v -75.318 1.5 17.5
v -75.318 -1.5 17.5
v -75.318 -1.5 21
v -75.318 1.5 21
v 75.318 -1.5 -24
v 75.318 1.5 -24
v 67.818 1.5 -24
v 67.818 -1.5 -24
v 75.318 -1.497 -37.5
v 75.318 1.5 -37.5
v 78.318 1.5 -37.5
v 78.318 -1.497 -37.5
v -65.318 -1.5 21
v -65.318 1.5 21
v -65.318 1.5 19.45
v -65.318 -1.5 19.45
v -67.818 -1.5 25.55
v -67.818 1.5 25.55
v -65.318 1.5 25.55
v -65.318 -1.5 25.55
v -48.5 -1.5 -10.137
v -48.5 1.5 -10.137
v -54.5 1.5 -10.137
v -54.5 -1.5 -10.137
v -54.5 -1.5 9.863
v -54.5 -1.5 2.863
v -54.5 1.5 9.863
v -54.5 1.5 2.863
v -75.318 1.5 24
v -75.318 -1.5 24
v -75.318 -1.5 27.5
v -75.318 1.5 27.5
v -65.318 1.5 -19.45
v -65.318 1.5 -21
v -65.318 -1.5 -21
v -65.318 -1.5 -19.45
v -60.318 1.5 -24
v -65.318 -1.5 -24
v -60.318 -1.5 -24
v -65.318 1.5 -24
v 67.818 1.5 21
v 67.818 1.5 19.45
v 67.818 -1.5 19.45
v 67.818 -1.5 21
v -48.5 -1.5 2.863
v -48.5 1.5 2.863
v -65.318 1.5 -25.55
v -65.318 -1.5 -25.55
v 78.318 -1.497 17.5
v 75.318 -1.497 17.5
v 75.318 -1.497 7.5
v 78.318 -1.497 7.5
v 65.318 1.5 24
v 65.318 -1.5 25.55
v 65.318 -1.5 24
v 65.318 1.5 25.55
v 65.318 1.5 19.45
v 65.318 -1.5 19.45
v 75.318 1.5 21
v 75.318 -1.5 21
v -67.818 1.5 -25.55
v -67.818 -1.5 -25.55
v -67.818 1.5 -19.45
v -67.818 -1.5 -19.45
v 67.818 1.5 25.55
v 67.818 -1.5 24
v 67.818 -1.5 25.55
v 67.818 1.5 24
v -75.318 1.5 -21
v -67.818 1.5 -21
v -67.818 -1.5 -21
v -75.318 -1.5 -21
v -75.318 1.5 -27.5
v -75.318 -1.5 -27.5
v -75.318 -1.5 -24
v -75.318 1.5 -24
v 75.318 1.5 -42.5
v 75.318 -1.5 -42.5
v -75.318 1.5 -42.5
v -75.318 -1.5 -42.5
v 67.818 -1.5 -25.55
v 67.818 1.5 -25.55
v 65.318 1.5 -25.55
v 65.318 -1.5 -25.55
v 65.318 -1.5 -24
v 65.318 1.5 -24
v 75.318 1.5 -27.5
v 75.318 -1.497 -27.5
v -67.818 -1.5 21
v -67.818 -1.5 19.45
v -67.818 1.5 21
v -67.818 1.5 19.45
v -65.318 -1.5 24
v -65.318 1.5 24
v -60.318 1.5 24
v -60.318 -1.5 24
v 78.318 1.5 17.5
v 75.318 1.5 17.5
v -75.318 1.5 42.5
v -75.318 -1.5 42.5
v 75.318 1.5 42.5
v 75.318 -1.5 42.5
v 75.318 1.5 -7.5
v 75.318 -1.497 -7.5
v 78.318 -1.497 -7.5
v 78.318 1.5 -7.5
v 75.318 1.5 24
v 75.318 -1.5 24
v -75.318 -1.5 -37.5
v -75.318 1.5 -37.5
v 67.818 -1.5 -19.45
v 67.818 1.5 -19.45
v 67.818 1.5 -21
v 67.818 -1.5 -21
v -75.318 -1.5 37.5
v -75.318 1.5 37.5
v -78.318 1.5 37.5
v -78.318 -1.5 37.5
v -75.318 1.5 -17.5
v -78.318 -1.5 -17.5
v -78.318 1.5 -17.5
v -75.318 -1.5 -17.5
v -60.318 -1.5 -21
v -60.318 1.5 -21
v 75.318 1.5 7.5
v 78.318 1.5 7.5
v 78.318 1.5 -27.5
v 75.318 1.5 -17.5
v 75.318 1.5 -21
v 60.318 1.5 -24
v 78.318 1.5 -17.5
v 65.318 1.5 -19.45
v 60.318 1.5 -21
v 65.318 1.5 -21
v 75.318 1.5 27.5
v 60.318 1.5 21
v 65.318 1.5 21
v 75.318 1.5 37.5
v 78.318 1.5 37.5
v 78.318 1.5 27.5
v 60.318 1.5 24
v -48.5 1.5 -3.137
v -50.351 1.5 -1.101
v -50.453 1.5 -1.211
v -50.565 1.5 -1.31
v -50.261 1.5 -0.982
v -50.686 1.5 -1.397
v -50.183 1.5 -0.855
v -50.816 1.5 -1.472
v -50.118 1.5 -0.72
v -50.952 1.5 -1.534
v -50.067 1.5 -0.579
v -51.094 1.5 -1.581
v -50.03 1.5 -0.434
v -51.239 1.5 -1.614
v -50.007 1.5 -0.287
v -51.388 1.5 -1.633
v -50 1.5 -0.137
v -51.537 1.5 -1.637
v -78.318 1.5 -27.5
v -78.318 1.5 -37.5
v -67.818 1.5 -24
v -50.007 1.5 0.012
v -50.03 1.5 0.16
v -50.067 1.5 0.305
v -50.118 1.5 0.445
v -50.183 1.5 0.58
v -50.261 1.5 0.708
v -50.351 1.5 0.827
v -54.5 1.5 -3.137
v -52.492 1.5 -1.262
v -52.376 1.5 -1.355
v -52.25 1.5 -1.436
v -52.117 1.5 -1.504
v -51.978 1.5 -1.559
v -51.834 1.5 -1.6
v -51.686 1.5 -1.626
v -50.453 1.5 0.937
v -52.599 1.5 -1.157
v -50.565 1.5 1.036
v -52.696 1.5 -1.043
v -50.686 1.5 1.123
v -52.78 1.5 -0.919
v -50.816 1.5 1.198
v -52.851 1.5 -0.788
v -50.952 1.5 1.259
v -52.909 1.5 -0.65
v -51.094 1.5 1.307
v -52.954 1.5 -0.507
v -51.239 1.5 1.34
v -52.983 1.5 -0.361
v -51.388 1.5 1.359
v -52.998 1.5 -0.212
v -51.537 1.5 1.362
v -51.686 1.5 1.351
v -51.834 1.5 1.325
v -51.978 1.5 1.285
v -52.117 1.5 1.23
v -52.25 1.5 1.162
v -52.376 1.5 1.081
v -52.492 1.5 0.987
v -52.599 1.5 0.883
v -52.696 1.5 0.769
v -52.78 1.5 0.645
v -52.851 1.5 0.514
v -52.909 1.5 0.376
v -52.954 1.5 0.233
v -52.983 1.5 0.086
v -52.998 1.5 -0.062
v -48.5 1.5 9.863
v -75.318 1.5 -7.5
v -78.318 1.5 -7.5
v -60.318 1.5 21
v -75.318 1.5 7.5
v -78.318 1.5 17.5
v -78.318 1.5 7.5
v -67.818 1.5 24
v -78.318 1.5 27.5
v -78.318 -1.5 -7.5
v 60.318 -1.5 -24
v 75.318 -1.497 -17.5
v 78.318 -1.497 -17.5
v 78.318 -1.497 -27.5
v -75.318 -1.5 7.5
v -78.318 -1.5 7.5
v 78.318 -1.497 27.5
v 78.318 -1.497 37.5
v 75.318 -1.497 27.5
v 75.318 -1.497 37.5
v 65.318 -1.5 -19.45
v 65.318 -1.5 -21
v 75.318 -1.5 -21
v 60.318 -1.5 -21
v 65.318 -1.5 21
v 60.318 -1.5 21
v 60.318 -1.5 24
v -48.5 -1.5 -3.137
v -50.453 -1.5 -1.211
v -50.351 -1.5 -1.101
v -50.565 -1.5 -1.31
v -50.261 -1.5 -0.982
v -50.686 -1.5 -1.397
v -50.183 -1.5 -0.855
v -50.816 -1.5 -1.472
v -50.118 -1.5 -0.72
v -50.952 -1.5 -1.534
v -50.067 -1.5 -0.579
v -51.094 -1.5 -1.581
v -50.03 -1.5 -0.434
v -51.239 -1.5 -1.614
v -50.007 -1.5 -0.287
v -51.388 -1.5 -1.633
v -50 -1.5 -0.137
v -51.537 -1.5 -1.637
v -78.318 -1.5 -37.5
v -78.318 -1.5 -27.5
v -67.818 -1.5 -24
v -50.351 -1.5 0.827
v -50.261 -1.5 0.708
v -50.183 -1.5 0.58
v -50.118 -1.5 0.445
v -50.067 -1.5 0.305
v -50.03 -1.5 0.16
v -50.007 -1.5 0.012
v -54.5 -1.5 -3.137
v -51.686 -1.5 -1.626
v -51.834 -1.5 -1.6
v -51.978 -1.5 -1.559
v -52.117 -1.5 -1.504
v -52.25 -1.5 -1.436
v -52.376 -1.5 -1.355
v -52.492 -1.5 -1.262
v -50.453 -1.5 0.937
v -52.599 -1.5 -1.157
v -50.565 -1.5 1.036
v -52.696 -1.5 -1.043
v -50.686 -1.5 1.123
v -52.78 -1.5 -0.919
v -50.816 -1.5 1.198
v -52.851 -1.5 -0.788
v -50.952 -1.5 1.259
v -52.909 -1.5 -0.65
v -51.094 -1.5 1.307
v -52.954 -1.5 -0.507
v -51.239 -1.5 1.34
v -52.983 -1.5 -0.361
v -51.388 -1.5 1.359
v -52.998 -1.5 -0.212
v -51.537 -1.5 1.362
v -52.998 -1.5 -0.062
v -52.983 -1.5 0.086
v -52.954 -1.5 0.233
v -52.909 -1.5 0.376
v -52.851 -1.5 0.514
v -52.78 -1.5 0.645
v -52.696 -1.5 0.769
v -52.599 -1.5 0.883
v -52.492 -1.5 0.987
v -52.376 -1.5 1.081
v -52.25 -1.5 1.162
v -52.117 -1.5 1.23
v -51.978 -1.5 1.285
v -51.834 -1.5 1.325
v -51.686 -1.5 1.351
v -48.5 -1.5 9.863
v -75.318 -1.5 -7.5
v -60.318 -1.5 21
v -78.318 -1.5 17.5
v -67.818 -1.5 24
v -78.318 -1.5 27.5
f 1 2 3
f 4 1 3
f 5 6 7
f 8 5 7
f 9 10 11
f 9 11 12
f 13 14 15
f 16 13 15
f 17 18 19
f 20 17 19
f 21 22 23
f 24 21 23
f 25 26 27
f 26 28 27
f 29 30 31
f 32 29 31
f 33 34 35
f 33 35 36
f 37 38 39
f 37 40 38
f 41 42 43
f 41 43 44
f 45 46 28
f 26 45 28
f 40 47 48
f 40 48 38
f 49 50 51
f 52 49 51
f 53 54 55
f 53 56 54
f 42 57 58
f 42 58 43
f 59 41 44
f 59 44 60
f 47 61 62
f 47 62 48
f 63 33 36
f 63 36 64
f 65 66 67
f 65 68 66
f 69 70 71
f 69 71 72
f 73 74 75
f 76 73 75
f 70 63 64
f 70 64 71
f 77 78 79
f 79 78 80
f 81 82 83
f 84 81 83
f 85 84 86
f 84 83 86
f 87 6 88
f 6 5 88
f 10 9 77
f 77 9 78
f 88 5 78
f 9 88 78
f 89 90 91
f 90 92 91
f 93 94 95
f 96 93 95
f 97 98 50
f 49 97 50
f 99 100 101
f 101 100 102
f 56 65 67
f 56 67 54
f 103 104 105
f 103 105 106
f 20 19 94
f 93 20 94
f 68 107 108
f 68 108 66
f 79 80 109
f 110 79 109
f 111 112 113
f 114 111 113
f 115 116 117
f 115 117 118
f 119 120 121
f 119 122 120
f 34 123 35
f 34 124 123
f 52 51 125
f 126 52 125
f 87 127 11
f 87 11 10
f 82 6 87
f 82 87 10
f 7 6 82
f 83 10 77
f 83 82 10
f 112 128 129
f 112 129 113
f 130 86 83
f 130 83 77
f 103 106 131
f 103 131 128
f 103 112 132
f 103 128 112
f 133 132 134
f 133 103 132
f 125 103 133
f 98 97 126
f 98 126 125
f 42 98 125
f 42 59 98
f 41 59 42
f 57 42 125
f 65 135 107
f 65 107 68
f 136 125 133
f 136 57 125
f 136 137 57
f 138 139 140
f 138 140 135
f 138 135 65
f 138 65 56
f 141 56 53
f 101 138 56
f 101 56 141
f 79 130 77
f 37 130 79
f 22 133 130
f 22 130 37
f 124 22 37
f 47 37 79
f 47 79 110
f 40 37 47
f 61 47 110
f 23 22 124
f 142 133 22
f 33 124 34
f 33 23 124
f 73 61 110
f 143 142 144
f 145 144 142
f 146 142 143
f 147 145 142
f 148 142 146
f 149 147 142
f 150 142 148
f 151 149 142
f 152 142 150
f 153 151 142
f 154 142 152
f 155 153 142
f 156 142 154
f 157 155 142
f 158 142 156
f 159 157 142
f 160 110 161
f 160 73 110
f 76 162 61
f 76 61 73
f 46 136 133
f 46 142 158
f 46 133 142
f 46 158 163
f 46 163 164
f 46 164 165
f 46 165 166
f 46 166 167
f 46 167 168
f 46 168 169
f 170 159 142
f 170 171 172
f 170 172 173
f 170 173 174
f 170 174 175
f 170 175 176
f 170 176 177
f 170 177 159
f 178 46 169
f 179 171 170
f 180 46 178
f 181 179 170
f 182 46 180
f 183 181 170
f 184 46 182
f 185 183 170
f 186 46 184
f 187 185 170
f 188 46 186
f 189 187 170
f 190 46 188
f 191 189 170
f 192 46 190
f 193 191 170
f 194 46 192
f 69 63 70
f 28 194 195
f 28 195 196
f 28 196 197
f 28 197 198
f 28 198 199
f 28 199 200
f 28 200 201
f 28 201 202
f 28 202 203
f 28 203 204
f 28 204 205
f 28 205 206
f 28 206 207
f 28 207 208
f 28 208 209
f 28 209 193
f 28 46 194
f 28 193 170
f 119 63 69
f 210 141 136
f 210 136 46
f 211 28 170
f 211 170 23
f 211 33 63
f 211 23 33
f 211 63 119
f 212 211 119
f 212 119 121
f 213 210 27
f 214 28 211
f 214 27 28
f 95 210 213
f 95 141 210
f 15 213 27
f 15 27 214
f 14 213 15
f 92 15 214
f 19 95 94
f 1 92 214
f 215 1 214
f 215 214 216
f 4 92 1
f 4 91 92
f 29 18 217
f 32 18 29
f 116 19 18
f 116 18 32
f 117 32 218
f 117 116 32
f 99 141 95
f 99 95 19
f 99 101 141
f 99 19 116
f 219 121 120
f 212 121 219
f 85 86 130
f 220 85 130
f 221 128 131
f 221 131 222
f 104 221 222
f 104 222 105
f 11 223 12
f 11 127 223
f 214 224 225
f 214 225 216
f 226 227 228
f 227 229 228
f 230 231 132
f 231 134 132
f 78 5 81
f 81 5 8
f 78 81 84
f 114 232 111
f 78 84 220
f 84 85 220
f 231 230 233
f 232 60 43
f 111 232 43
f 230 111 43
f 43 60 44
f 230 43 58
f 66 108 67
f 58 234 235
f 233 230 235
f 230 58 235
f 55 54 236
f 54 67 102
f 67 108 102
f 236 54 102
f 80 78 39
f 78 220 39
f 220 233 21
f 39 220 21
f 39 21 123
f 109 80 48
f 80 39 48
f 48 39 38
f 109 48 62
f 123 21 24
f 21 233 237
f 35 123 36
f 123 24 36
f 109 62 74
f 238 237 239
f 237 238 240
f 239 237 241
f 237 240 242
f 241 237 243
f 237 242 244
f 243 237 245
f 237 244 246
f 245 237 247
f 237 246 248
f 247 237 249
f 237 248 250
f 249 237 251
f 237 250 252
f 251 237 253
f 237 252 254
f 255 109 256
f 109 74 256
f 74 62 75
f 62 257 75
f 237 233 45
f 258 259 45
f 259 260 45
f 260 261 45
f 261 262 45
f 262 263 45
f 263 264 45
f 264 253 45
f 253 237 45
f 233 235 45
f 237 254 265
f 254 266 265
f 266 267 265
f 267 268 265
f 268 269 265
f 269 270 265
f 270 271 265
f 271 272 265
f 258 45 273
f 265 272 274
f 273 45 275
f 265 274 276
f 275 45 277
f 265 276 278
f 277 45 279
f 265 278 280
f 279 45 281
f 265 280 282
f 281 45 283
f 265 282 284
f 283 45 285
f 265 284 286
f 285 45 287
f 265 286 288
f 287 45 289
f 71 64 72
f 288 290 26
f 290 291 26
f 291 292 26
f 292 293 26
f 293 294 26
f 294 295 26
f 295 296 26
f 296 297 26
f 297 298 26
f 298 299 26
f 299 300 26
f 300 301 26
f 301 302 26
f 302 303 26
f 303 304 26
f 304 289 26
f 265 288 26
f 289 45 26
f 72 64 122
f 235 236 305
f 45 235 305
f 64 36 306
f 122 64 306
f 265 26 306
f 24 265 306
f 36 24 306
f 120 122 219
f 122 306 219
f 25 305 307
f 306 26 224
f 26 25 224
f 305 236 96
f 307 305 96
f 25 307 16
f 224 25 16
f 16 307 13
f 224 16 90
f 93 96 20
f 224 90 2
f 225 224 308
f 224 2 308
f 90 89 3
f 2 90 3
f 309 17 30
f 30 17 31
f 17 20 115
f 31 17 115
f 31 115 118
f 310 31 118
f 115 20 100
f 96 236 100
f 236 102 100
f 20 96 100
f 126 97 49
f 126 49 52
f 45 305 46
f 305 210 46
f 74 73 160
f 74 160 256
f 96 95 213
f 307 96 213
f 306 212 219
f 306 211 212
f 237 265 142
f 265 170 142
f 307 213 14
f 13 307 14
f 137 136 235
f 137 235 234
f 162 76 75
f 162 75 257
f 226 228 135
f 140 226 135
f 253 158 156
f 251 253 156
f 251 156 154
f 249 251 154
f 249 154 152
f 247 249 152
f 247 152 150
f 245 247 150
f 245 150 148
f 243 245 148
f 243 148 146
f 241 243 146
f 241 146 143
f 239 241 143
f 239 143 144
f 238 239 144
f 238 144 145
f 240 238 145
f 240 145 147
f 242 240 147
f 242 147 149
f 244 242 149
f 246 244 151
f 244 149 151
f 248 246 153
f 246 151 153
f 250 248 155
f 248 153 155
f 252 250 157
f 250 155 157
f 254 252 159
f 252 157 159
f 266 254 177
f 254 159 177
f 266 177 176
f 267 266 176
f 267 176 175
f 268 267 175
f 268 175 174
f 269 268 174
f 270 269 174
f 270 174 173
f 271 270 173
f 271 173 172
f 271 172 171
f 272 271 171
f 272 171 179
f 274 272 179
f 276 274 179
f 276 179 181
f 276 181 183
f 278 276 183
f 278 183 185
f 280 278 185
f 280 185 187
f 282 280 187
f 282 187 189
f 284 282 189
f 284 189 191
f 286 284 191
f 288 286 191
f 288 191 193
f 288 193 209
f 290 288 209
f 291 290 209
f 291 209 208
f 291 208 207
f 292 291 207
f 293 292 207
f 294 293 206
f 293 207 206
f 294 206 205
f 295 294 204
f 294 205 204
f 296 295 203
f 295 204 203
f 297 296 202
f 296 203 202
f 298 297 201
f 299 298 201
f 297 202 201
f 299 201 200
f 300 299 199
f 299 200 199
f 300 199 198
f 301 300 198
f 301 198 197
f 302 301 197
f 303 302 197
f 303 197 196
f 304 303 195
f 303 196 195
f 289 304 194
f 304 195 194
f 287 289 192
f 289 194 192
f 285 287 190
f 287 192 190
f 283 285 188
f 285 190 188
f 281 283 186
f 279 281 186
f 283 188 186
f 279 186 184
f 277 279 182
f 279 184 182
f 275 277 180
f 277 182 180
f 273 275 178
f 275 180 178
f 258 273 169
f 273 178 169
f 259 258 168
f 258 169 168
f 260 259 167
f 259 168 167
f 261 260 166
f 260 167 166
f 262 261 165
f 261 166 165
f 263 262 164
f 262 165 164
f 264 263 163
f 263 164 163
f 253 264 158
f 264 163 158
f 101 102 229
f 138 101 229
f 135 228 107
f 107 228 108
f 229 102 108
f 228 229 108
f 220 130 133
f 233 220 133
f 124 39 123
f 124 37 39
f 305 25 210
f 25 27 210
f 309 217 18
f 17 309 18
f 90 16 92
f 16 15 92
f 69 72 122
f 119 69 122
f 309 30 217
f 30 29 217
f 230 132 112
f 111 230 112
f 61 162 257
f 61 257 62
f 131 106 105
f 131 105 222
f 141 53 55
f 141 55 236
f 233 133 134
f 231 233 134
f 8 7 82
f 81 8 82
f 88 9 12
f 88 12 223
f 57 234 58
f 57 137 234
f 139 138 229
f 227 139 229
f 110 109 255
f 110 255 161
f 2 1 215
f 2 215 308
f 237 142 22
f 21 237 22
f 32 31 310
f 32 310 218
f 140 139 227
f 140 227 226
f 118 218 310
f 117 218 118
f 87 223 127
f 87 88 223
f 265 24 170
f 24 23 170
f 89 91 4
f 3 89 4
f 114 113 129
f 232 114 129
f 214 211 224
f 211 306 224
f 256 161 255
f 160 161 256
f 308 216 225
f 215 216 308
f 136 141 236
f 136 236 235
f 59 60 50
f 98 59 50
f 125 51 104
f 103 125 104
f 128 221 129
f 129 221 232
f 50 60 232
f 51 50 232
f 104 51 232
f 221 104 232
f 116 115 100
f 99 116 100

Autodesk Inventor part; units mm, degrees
ref_plane "YZ Plane" through (0, 0, 0) normal (1, 0, 0) x (0, 1, 0)
ref_plane "XZ Plane" through (0, 0, 0) normal (0, 1, 0) x (-1, 0, 0)
ref_plane "XY Plane" through (0, 0, 0) normal (0, 0, 1) x (1, 0, 0)
sketch "Эскиз1" plane through (0, 0, 0) normal (0, 1, 0) x (-1, 0, 0)
  line L0 (75.318, 42.5) -> (-75.318, 42.5)
  line L1 (-75.318, 42.5) -> (-75.318, -42.5)
  line L2 (-75.318, -42.5) -> (75.318, -42.5)
  line L3 (75.318, -42.5) -> (75.318, 42.5)
  line L4 (75.318, 42.5) -> (-75.318, -42.5) construction
  line L5 (-75.318, 42.5) -> (75.318, -42.5) construction
  point P0 (0, 0)
  dimension "d0" = 150.636
  dimension "d1" = 85
extrude "Выдавливание1" add sketch "Эскиз1" along normal mid plane 3
sketch "Эскиз3" plane through (-75.318, -1.5, 42.5) normal (-1, 0, 0) x (0, 0, 1)
  line L0 (-85, 0) -> (0, 0) projected
  line L1 (-80, 3) -> (-70, 3)
  line L2 (-70, 3) -> (-70, 0)
  line L3 (-70, 0) -> (-80, 0)
  line L4 (-80, 0) -> (-80, 3)
  line L5 (-80, 3) -> (-70, 0) construction
  line L6 (-70, 3) -> (-80, 0) construction
  line L7 (-60, 3) -> (-50, 3)
  line L8 (-50, 3) -> (-50, 0)
  line L9 (-50, 0) -> (-60, 0)
  line L10 (-60, 0) -> (-60, 3)
  line L11 (-60, 3) -> (-50, 0) construction
  line L12 (-50, 3) -> (-60, 0) construction
  line L13 (-35, 3) -> (-25, 3)
  line L14 (-25, 3) -> (-25, 0)
  line L15 (-25, 0) -> (-35, 0)
  line L16 (-35, 0) -> (-35, 3)
  line L17 (-35, 3) -> (-25, 0) construction
  line L18 (-25, 3) -> (-35, 0) construction
  line L19 (-15, 3) -> (-5, 3)
  line L20 (-5, 3) -> (-5, 0)
  line L21 (-5, 0) -> (-15, 0)
  line L22 (-15, 0) -> (-15, 3)
  line L23 (-15, 3) -> (-5, 0) construction
  line L24 (-5, 3) -> (-15, 0) construction
  line L25 (0, 0) -> (0, 3) projected
  line L26 (-85, 0) -> (-85, 3) projected
  point P0 (-42.5, 1.5)
  point P1 (-75, 1.5)
  point P2 (-55, 1.5)
  point P3 (-30, 1.5)
  point P4 (-10, 1.5)
  point P5 (-15, 1.5)
  point P6 (-25, 1.5)
  point P7 (-60, 1.5)
  point P8 (-35, 0)
  point P9 (-15, 0)
  dimension "d8" = 10
  dimension "d9" = 10
  dimension "d10" = 10
  dimension "d11" = 10
  dimension "d12" = 3
  dimension "d13" = 10
  dimension "d14" = 10
  dimension "d15" = 5
  dimension "d16" = 5
extrude "Выдавливание3" add sketch "Эскиз3" along normal blind 3
sketch "Эскиз4" plane through (75.318, -1.5, -42.5) normal (1, 0, 0) x (0, 0, -1)
  line L0 (-85, 3) -> (0, 3) projected
  line L1 (-80, 0.0026) -> (-70, 0.0026)
  line L2 (-70, 0.0026) -> (-70, 3)
  line L3 (-70, 3) -> (-80, 3)
  line L4 (-80, 3) -> (-80, 0.0026)
  line L5 (-80, 0.0026) -> (-70, 3) construction
  line L6 (-70, 0.0026) -> (-80, 3) construction
  line L7 (-60, 0.0026) -> (-50, 0.0026)
  line L8 (-50, 0.0026) -> (-50, 3)
  line L9 (-50, 3) -> (-60, 3)
  line L10 (-60, 3) -> (-60, 0.0026)
  line L11 (-60, 0.0026) -> (-50, 3) construction
  line L12 (-50, 0.0026) -> (-60, 3) construction
  line L13 (-42.5, 3) -> (-42.5, 0) construction
  line L14 (0, 0) -> (-85, 0) projected
  line L15 (-5, 0.0026) -> (-15, 0.0026)
  line L16 (-15, 0.0026) -> (-15, 3)
  line L17 (-15, 3) -> (-5, 3)
  line L18 (-5, 3) -> (-5, 0.0026)
  line L19 (-5, 0.0026) -> (-15, 3) construction
  line L20 (-15, 0.0026) -> (-5, 3) construction
  line L21 (-25, 0.0026) -> (-35, 0.0026)
  line L22 (-35, 0.0026) -> (-35, 3)
  line L23 (-35, 3) -> (-25, 3)
  line L24 (-25, 3) -> (-25, 0.0026)
  line L25 (-25, 0.0026) -> (-35, 3) construction
  line L26 (-35, 0.0026) -> (-25, 3) construction
  line L27 (-85, 3) -> (-85, 0) projected
  point P0 (-42.5, 1.5)
  point P1 (-75, 1.5013)
  point P2 (-55, 1.5013)
  point P3 (-10, 1.5013)
  point P4 (-30, 1.5013)
  point P5 (-35, 3)
  point P6 (-5, 3)
  point P7 (-15, 3)
  dimension "d19" = 10
  dimension "d24" = 20
  dimension "d29" = 5
extrude "Выдавливание4" add sketch "Эскиз4" along normal blind 3
sketch "Эскиз5" plane through (0, 1.5, 0) normal (0, 1, 0) x (1, 0, 0)
  line L0 (-75.318, 7.5) -> (-75.318, -7.5) projected
  line L1 (-54.4999, -2.8628) -> (-54.4999, -9.8628)
  line L2 (-54.4999, -9.8628) -> (-48.4999, -9.8628)
  line L3 (-48.4999, -9.8628) -> (-48.4999, -2.8628)
  line L4 (-48.4999, -2.8628) -> (-54.4999, -2.8628)
  line L5 (-48.4999, 3.1372) -> (-48.4999, 10.1372)
  line L6 (-48.4999, 10.1372) -> (-54.4999, 10.1372)
  line L7 (-54.4999, 10.1372) -> (-54.4999, 3.1372)
  line L8 (-54.4999, 3.1372) -> (-48.4999, 3.1372)
  line L9 (-51.4999, -2.8628) -> (-51.4999, 3.1372)
  circle A0 centre (-51.4999, 0.1372) radius 1.5
  point P0 (0, 0)
  dimension "d37" = 3
extrude "Выдавливание5" cut sketch "Эскиз5" against normal blind 3
sketch "Эскиз6" plane through (0, 1.5, 0) normal (0, 1, 0) x (1, 0, 0)
  line L0 (75.318, -27.5) -> (75.318, -17.5) projected
  line L1 (60.318, -24) -> (60.318, -21)
  line L2 (75.318, -21) -> (75.318, -24)
  line L3 (67.818, -25.55) -> (65.318, -25.55)
  line L4 (65.318, -19.45) -> (67.818, -19.45)
  line L5 (67.818, -19.45) -> (67.818, -21)
  line L6 (67.818, -24) -> (67.818, -25.55)
  line L7 (75.318, -24) -> (67.818, -24)
  line L8 (65.318, -24) -> (60.318, -24)
  line L9 (65.318, -25.55) -> (65.318, -24)
  line L10 (65.318, -21) -> (65.318, -19.45)
  line L11 (60.318, -21) -> (65.318, -21)
  line L12 (67.818, -21) -> (75.318, -21)
  line L13 (66.568, 0) -> (53.2147, 0) construction
  line L14 (0, -10.2584) -> (0, 8.5624) construction
  line L15 (75.318, 27.5) -> (75.318, 17.5)
  line L16 (60.318, 24) -> (60.318, 21)
  line L17 (75.318, 21) -> (75.318, 24)
  line L18 (67.818, 25.55) -> (65.318, 25.55)
  line L19 (65.318, 19.45) -> (67.818, 19.45)
  line L20 (67.818, 19.45) -> (67.818, 21)
  line L21 (67.818, 24) -> (67.818, 25.55)
  line L22 (75.318, 24) -> (67.818, 24)
  line L23 (65.318, 24) -> (60.318, 24)
  line L24 (65.318, 25.55) -> (65.318, 24)
  line L25 (65.318, 21) -> (65.318, 19.45)
  line L26 (60.318, 21) -> (65.318, 21)
  line L27 (67.818, 21) -> (75.318, 21)
  line L28 (0, 10.2584) -> (0, -8.5624) construction
  line L29 (-75.318, -27.5) -> (-75.318, -17.5)
  line L30 (-60.318, -24) -> (-60.318, -21)
  line L31 (-75.318, -21) -> (-75.318, -24)
  line L32 (-67.818, -25.55) -> (-65.318, -25.55)
  line L33 (-65.318, -19.45) -> (-67.818, -19.45)
  line L34 (-67.818, -19.45) -> (-67.818, -21)
  line L35 (-67.818, -24) -> (-67.818, -25.55)
  line L36 (-75.318, -24) -> (-67.818, -24)
  line L37 (-65.318, -24) -> (-60.318, -24)
  line L38 (-65.318, -25.55) -> (-65.318, -24)
  line L39 (-65.318, -21) -> (-65.318, -19.45)
  line L40 (-60.318, -21) -> (-65.318, -21)
  line L41 (-67.818, -21) -> (-75.318, -21)
  line L42 (-66.568, 0) -> (-53.2147, 0) construction
  line L43 (-60.318, 24) -> (-60.318, 21)
  line L44 (-65.318, 24) -> (-60.318, 24)
  line L45 (-60.318, 21) -> (-65.318, 21)
  line L46 (-65.318, 21) -> (-65.318, 19.45)
  line L47 (-65.318, 19.45) -> (-67.818, 19.45)
  line L48 (-67.818, 19.45) -> (-67.818, 21)
  line L49 (-65.318, 25.55) -> (-65.318, 24)
  line L50 (-67.818, 25.55) -> (-65.318, 25.55)
  line L51 (-67.818, 24) -> (-67.818, 25.55)
  line L52 (-67.818, 21) -> (-75.318, 21)
  line L53 (-75.318, 21) -> (-75.318, 24)
  line L54 (-75.318, 27.5) -> (-75.318, 17.5)
  line L55 (-75.318, 24) -> (-67.818, 24)
  point P0 (0, 0)
  point P1 (67.818, -23.3834)
  point P2 (67.818, 23.3834)
  point P3 (-67.818, -23.3834)
  point P4 (-67.818, 23.3834)
  point P5 (-75.318, -21)
  point P6 (75.318, -22.5)
  dimension "d38" = 6.1
  dimension "d39" = 3
  dimension "d40" = 2.5
  dimension "d41" = 15
  dimension "d42" = 1.55
  dimension "d43" = 1.55
  dimension "d44" = 1.55
  dimension "d45" = 1.55
extrude "Выдавливание6" cut sketch "Эскиз6" against normal blind 3
properties part number "Нижняя часть головы"
